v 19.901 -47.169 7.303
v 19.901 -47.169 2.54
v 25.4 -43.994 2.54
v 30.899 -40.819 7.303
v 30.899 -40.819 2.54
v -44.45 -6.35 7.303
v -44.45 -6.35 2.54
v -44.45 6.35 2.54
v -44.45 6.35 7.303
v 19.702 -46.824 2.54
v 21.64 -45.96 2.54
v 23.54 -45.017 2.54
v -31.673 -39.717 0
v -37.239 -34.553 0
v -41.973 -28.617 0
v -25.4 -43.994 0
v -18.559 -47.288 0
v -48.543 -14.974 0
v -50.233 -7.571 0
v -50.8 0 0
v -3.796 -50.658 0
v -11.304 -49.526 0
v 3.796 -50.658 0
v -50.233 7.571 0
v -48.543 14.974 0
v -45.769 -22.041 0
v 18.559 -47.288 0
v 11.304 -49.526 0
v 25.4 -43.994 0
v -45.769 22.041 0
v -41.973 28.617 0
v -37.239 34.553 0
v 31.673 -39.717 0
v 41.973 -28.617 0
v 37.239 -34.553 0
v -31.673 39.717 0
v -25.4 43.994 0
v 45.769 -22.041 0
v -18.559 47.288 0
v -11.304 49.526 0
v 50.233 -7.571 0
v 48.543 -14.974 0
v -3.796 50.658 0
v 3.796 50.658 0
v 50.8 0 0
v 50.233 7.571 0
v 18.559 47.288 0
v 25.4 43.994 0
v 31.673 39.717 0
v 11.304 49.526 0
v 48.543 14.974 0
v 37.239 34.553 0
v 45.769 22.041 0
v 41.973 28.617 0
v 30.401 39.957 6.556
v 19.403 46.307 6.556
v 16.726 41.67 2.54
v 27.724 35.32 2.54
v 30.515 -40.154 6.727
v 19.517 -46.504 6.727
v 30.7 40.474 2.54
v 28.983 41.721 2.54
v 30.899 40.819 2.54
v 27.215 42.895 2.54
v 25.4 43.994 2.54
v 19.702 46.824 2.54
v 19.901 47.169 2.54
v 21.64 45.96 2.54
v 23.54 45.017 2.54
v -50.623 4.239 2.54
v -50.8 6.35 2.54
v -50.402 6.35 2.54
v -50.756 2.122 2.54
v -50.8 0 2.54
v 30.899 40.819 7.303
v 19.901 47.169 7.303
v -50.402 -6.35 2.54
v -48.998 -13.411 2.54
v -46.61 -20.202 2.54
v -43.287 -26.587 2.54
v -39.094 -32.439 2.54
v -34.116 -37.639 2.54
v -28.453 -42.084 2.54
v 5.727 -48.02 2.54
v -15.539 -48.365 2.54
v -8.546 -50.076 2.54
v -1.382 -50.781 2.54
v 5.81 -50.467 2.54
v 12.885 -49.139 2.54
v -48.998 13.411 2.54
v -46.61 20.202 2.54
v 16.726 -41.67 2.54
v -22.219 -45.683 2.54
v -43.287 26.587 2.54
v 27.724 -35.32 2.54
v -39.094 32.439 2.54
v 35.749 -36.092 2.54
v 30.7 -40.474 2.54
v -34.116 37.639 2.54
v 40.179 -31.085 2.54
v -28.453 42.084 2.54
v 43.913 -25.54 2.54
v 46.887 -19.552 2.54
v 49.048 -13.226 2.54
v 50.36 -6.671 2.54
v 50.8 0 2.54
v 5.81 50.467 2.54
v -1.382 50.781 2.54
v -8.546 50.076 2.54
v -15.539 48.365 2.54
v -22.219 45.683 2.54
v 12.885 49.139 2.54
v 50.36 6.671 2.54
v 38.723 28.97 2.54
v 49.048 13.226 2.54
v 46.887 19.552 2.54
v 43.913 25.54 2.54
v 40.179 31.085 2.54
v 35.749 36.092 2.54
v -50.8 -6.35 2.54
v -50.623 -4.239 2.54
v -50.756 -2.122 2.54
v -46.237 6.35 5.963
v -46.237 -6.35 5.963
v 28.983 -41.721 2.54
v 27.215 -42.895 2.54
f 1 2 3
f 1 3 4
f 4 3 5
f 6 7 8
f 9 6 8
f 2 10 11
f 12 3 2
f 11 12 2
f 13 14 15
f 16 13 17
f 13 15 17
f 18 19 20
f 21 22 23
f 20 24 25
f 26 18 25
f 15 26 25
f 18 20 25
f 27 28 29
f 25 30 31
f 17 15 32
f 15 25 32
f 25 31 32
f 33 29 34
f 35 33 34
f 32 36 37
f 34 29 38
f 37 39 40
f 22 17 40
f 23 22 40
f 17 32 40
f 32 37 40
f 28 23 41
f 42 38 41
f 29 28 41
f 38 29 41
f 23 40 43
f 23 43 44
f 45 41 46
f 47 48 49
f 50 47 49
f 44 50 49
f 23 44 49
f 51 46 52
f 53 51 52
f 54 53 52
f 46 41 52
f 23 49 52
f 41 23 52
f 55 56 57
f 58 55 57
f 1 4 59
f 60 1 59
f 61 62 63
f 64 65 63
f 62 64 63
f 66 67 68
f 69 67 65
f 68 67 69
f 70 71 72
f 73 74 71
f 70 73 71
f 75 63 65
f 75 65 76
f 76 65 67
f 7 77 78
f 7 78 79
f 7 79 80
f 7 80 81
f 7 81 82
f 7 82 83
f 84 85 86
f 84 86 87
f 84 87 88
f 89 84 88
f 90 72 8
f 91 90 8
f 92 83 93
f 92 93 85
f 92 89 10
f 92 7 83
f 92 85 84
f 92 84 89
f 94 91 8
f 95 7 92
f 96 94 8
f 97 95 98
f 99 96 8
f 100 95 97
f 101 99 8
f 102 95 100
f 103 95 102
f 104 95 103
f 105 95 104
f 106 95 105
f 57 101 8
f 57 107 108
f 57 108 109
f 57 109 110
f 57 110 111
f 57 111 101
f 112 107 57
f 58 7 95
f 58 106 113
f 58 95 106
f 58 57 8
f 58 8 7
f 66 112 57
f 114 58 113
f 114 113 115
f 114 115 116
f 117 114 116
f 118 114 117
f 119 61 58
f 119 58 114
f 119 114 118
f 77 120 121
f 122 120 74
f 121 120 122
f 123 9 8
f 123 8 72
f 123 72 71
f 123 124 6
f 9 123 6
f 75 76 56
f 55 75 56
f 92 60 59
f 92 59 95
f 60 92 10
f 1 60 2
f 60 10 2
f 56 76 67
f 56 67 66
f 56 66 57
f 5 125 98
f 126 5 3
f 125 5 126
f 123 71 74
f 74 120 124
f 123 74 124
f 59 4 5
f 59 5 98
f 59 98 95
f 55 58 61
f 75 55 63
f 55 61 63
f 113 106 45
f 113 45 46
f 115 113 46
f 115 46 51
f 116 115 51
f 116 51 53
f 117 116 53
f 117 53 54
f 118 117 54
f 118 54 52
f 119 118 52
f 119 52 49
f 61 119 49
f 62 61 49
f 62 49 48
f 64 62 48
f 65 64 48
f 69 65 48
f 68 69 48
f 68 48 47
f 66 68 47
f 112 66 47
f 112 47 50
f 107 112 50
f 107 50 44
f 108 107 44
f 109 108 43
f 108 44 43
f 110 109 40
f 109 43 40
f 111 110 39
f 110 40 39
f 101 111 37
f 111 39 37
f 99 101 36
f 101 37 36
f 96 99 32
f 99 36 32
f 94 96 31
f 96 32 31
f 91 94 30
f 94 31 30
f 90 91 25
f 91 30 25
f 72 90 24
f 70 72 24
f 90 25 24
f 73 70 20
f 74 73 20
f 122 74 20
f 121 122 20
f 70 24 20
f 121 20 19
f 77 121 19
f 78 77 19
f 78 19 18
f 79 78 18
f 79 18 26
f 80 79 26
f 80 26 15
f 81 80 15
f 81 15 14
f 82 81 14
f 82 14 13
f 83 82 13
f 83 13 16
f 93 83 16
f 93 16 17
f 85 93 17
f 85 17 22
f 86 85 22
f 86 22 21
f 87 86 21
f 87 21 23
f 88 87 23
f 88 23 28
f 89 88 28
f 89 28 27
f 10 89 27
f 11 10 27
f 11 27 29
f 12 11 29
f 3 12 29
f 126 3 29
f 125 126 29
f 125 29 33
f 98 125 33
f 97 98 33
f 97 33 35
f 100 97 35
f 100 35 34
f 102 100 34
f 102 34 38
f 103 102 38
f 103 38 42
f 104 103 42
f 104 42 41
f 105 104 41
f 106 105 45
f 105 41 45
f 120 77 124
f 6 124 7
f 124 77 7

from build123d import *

# Parameters (mm, degrees)
F0_R     = 50.8
F1_DEPTH = 2.54
F3_DEPTH = 12.7
F5_DEPTH = 25.4
F7_DEPTH = 25.4
F9_DEPTH = 25.4


# Not quite as in the source:
# - a feature names something its author has since deleted; it is built from what else it names


with BuildPart() as f1:
    # F0 (on Top) → F1 (new body)
    with BuildSketch(Plane.XY):
        Circle(F0_R)
    extrude(amount=F1_DEPTH)

    # F2 (on face) → F3 (join)
    with BuildSketch(Plane.XY.offset(2.54)):
        Polygon((-50.8, 6.35), (-50.8, 0), (-50.8, -6.35), (-44.45, -6.35), (-44.45, 6.35), align=None)
        Polygon((16.725738686, -41.6698291982), (19.900738686, -47.1690905122), (30.899261314, -40.8190905122), (27.724261314, -35.3198291982), align=None)
        Polygon((27.724261314, 35.3198291982), (30.899261314, 40.8190905122), (19.900738686, 47.1690905122), (16.725738686, 41.6698291982), align=None)
    extrude(amount=F3_DEPTH)

    # F4 (on face) → F5 (cut)
    with BuildSketch(Plane.XZ.offset(6.35)):
        Polygon((-50.8, 15.24), (-50.8, 2.54), (-46.2367217033, 5.962595906), (-44.45, 7.3026908967), (-44.45, 15.24), align=None)
    extrude(amount=-F5_DEPTH, mode=Mode.SUBTRACT)

    # F6 (on face) → F7 (cut)
    with BuildSketch(Plane(origin=(5.499261314, 3.175, 0), x_dir=(-0.5, 0.8660254038, 0), z_dir=(0.8660254038, 0.5, 0))):
        Polygon((-50.0320994455, 6.7267423959), (-44.45, 2.54), (-44.45, 15.24), (-50.8, 15.24), (-50.8, 7.3026908967), align=None)
    extrude(amount=-F7_DEPTH, mode=Mode.SUBTRACT)

    # F8 (on face) → F9 (cut)
    with BuildSketch(Plane(origin=(-5.499261314, 3.175, 0), x_dir=(-0.5, -0.8660254038, 0), z_dir=(-0.8660254038, 0.5, 0))):
        Polygon((-50.8, 15.24), (-50.8, 7.3026908967), (-49.8044750842, 6.556017282), (-44.45, 2.54), (-44.45, 15.24), align=None)
    extrude(amount=-F9_DEPTH, mode=Mode.SUBTRACT)


solid = f1.part
